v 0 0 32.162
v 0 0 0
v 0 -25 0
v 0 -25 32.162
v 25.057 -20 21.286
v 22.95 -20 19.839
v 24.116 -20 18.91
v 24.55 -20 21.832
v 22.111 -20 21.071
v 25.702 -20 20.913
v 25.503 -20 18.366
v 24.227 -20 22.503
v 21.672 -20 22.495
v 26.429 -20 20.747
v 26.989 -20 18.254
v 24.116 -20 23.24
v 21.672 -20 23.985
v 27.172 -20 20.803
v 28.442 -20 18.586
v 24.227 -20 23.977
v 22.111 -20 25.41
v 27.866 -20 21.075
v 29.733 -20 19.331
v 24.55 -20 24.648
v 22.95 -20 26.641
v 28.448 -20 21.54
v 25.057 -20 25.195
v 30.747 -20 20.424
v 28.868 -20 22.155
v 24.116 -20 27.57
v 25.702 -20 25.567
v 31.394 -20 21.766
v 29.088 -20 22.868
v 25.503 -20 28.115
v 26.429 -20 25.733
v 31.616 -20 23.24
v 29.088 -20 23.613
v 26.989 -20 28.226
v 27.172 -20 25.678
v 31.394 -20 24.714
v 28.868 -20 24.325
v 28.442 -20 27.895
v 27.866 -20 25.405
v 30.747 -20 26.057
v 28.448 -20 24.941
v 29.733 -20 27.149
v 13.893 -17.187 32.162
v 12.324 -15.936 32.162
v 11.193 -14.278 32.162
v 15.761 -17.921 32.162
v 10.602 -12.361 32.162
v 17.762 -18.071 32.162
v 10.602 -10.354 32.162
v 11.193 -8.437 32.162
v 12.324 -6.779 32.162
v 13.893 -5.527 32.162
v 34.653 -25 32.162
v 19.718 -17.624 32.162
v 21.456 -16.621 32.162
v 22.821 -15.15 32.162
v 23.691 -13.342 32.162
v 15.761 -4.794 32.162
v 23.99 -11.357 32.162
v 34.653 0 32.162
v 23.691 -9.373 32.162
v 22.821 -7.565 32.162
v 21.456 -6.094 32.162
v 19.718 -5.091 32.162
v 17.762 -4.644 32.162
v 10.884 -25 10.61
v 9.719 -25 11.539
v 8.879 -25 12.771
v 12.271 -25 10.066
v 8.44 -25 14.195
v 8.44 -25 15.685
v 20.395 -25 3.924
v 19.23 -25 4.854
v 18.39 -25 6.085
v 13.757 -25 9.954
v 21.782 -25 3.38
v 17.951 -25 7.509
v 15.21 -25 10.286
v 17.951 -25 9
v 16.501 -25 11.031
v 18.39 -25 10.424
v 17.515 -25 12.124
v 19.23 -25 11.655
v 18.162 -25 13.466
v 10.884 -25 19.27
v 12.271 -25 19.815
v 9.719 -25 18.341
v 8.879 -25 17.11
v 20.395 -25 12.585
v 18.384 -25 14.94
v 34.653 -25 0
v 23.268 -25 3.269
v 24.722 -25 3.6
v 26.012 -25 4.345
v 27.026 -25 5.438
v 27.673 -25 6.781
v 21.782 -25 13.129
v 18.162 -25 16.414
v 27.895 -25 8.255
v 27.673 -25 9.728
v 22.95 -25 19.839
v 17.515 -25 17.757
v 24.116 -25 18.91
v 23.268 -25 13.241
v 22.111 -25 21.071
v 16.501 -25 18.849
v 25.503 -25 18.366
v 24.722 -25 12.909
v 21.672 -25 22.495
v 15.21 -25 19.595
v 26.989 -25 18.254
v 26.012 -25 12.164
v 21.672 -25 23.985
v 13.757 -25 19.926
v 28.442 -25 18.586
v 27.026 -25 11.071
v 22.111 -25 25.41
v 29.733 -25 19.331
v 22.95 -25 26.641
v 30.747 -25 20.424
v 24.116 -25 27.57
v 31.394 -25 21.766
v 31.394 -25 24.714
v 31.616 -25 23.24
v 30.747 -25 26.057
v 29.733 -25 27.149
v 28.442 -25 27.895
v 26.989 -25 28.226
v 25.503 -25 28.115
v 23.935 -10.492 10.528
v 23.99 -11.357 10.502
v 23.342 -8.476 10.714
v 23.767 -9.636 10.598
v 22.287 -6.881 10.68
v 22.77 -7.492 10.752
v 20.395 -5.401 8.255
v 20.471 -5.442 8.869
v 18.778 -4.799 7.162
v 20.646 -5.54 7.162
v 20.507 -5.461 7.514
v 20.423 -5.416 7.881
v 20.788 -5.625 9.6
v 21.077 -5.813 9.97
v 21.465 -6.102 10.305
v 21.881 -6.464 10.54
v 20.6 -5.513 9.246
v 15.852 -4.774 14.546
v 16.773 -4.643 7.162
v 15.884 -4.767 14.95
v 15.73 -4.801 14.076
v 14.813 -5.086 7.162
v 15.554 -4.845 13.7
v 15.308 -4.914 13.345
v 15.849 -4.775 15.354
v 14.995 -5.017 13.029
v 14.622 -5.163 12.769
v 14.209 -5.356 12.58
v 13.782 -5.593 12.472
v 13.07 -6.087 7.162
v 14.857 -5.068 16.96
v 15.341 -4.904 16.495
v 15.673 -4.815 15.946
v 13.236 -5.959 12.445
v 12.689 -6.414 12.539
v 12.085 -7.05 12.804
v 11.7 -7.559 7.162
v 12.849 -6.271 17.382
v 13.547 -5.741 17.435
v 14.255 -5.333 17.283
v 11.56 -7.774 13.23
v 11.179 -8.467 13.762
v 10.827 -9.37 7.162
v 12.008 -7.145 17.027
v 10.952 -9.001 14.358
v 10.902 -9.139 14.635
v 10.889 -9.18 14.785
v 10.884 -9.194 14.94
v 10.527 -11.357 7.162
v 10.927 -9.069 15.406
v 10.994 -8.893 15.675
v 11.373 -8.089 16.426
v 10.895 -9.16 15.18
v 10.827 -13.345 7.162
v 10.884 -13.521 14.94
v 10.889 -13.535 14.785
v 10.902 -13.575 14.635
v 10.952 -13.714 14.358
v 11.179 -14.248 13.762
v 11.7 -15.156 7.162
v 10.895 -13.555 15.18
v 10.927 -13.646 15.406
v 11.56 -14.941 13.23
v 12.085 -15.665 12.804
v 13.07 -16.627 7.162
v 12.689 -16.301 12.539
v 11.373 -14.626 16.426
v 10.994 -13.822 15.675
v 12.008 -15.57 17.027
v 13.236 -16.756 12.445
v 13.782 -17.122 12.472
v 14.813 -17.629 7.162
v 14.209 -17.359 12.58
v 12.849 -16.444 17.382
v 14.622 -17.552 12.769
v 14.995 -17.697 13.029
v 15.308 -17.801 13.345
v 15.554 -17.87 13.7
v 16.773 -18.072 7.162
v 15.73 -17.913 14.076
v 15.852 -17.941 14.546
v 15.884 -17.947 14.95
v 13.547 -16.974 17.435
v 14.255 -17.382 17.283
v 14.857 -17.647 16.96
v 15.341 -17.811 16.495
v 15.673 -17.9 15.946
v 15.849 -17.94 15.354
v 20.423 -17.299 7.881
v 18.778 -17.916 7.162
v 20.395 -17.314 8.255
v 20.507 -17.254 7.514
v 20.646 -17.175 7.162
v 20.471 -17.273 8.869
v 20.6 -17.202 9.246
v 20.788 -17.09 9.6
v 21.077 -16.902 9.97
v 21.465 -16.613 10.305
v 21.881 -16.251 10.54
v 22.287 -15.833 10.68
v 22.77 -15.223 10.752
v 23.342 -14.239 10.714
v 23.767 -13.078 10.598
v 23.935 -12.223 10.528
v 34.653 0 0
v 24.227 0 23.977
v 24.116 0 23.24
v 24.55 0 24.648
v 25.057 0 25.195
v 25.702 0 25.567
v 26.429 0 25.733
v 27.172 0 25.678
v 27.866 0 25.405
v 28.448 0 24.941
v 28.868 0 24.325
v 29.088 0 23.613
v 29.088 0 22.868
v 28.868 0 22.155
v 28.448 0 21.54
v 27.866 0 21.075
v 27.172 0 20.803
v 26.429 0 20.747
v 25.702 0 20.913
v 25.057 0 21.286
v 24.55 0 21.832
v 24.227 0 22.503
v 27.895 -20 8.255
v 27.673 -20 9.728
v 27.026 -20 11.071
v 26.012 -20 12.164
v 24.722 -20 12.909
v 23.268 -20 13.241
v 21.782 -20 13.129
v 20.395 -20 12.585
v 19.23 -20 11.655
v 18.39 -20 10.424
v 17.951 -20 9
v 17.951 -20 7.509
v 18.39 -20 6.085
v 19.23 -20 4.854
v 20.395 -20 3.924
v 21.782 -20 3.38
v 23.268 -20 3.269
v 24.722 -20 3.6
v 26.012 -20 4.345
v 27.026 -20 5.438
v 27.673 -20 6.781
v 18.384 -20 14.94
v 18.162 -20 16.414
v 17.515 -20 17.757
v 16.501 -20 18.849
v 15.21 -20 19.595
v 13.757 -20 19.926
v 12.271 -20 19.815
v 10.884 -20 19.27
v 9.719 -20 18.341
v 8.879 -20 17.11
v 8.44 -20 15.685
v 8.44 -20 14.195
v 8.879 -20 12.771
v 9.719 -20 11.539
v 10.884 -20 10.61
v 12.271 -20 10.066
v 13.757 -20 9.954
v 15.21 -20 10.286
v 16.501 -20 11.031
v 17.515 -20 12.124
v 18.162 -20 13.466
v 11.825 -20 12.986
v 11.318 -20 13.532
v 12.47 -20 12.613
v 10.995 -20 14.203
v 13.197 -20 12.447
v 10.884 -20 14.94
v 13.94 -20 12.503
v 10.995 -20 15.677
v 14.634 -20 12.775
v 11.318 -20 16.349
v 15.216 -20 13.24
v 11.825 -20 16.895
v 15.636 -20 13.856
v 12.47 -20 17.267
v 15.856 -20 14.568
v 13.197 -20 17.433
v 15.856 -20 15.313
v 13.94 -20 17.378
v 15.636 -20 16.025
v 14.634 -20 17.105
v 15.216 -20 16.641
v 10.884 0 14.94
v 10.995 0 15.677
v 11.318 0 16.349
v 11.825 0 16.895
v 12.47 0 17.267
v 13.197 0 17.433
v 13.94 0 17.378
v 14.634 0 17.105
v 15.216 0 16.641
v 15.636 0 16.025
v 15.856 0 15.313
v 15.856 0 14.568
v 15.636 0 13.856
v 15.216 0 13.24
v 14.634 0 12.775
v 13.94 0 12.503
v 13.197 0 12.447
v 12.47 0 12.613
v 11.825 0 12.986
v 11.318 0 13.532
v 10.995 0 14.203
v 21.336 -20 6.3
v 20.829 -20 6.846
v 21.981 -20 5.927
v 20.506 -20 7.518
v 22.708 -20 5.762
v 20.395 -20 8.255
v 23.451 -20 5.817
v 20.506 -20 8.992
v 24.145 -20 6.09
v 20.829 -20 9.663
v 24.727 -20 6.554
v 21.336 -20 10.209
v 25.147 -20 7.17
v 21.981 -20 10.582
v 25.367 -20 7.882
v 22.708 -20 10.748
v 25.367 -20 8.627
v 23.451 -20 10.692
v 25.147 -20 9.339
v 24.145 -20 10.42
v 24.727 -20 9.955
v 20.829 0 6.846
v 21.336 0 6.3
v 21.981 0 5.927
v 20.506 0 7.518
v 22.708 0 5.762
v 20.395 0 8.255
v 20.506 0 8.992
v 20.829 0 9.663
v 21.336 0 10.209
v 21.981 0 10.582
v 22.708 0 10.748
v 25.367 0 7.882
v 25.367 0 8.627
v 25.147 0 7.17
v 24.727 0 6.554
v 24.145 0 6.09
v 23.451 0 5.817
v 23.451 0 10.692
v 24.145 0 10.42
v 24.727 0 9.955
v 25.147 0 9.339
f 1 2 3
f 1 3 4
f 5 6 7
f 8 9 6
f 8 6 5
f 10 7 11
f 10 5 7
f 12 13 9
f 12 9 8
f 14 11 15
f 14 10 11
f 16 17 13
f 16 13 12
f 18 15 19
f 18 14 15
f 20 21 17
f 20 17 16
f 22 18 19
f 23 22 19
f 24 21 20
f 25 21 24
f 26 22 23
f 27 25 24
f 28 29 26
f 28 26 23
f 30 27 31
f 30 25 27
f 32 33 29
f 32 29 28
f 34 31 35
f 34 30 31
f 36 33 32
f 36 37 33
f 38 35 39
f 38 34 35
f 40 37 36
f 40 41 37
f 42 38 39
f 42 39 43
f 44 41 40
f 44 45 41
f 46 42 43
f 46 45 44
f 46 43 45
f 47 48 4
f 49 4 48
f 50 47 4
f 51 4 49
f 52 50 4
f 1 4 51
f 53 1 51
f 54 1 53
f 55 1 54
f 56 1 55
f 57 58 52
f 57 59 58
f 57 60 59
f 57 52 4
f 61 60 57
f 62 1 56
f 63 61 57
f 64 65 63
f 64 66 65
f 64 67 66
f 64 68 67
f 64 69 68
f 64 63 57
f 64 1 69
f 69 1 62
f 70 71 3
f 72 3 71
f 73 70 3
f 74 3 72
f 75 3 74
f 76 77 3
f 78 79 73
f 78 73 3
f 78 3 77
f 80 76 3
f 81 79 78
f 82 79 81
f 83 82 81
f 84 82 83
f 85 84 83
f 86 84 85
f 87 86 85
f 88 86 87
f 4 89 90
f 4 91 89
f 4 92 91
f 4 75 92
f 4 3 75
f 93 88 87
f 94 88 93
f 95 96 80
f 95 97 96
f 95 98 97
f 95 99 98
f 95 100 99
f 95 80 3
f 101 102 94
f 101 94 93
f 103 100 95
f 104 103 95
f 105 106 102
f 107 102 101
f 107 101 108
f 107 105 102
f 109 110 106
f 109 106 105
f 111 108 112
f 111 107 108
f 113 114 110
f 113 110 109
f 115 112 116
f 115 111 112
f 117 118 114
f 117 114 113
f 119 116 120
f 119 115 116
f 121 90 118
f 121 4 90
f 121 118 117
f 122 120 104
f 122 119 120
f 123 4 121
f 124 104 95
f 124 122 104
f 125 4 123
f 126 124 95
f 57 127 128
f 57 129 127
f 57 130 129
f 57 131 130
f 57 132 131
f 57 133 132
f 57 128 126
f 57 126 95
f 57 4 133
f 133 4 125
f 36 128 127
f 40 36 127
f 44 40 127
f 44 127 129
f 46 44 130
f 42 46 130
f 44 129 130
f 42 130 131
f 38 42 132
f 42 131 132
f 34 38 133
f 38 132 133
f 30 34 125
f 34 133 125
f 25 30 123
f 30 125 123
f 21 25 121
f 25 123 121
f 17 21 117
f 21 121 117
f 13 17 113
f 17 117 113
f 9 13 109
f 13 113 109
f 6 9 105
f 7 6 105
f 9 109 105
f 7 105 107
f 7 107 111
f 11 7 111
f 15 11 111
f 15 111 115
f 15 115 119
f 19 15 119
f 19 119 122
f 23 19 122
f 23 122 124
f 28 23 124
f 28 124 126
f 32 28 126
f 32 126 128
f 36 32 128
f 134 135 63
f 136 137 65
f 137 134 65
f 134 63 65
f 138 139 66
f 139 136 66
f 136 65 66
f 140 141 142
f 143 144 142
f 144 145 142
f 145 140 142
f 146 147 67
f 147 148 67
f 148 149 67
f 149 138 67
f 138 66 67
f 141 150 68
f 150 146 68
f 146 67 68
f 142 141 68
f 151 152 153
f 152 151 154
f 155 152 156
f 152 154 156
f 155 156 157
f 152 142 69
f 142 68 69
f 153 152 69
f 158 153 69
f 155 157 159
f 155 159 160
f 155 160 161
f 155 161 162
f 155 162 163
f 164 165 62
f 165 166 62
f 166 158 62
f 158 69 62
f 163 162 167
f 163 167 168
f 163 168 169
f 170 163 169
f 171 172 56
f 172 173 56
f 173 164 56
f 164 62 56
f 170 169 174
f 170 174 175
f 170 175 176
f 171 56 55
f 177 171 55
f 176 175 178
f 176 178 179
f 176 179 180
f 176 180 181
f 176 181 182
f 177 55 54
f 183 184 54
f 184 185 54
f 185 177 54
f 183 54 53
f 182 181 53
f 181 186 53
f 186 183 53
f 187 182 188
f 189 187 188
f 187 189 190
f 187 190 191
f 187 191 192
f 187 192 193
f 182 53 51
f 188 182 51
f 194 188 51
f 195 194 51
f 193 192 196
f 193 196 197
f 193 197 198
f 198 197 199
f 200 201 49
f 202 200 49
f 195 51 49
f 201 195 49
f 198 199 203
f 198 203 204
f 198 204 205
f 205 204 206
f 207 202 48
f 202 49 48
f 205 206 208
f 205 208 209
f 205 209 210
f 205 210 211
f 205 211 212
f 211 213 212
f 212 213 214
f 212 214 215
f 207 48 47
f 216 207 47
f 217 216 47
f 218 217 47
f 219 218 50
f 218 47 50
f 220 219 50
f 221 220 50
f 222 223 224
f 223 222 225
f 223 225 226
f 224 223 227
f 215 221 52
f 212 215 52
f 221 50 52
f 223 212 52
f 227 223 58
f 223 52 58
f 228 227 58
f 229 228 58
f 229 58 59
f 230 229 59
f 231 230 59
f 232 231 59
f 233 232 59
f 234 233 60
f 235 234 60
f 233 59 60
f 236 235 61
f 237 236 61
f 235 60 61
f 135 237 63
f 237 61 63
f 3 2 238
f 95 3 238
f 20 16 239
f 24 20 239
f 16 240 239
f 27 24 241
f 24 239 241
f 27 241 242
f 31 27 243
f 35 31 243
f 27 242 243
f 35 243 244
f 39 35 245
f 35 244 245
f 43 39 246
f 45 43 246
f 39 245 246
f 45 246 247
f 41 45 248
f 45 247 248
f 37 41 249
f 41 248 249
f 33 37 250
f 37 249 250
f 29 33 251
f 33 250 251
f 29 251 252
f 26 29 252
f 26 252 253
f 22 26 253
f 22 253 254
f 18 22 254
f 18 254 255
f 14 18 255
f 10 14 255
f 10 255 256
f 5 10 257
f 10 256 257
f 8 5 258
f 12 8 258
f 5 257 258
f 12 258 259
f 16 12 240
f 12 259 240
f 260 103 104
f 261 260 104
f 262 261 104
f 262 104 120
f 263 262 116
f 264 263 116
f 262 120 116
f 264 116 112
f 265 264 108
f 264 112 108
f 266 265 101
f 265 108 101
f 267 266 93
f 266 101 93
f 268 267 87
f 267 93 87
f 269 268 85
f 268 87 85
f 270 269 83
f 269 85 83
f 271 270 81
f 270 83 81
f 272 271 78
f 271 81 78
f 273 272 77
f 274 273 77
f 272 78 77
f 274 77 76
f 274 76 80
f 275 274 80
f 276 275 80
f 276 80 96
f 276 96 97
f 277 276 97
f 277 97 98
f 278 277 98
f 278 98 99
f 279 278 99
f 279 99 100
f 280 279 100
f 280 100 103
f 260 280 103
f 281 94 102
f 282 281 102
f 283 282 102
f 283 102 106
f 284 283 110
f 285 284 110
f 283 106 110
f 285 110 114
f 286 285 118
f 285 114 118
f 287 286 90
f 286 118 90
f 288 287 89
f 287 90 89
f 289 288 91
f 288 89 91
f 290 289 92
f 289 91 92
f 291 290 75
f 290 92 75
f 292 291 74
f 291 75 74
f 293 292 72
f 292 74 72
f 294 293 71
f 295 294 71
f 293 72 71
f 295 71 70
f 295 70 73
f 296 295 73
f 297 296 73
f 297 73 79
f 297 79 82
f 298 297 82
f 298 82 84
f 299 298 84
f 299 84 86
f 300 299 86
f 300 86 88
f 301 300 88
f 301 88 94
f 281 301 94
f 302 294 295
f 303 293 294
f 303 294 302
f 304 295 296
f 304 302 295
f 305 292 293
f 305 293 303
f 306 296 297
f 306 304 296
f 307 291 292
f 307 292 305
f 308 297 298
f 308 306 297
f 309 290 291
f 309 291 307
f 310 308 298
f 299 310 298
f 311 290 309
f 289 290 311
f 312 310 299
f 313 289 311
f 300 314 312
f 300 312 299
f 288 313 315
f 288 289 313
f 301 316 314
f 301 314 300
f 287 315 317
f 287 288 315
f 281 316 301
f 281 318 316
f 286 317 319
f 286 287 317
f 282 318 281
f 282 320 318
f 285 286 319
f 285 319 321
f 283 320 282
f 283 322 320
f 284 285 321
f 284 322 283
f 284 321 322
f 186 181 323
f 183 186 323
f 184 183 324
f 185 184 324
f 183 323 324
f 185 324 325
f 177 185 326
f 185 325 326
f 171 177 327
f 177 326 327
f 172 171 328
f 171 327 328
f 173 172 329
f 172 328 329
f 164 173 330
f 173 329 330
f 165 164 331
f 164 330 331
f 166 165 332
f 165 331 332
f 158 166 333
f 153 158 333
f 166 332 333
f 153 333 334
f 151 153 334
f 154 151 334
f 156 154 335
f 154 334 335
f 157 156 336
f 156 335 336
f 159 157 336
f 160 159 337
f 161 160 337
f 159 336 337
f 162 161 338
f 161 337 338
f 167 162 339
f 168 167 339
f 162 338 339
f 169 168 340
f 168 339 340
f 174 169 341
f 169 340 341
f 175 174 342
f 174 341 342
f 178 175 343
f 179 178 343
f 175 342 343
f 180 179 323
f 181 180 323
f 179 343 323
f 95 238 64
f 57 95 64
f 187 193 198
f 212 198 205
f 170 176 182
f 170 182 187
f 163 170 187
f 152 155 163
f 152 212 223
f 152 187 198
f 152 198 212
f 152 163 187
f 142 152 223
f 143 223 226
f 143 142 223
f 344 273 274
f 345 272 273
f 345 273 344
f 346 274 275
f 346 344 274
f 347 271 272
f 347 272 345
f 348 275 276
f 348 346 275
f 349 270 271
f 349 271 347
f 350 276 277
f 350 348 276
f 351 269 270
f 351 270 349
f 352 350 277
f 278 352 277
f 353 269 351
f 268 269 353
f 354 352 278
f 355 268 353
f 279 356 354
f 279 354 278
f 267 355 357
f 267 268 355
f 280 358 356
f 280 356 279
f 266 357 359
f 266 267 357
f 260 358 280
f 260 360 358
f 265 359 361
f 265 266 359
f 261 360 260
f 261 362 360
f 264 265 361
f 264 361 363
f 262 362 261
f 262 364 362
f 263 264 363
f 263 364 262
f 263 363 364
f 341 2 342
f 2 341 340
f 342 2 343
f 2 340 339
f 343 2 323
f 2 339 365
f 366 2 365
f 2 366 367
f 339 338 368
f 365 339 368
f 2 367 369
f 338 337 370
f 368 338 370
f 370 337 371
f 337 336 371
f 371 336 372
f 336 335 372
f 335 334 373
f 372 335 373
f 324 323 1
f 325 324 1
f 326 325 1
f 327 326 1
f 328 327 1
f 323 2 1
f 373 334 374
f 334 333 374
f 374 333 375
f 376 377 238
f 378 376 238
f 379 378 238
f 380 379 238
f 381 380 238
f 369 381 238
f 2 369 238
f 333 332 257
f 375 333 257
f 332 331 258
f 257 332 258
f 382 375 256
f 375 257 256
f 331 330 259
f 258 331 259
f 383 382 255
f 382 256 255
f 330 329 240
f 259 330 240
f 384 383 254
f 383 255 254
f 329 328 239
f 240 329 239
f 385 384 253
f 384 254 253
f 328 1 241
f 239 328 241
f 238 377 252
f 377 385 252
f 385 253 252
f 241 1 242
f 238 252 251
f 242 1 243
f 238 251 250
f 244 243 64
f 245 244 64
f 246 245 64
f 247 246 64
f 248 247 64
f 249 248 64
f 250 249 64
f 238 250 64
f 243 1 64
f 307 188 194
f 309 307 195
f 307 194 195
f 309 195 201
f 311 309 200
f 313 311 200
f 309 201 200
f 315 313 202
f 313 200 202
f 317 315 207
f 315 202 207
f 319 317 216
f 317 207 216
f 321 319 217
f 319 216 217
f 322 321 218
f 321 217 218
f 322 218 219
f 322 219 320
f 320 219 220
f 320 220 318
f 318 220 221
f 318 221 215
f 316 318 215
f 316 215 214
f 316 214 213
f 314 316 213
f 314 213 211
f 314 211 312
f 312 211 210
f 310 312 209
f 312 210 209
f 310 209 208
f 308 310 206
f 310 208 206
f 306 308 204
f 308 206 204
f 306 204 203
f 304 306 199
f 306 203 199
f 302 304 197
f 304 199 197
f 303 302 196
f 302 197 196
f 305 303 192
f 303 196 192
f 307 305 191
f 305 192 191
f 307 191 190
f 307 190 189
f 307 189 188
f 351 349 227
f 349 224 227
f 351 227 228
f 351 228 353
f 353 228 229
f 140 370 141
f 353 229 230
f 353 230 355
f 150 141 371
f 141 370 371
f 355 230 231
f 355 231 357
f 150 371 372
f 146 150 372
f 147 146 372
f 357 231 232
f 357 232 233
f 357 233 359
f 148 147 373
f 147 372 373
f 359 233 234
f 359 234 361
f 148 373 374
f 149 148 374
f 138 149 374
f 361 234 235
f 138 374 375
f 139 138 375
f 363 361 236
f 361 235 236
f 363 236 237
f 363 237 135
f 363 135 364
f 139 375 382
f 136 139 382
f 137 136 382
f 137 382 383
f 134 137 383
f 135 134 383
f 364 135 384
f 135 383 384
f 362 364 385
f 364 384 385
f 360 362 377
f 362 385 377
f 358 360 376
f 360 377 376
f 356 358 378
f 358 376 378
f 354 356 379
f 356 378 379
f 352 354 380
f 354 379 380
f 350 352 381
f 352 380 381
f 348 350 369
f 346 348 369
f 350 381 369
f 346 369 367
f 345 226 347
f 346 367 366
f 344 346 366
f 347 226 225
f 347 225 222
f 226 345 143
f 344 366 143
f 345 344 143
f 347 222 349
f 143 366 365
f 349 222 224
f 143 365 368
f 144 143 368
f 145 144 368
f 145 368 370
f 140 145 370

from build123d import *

# Parameters (mm, degrees)
F0_W           = 34.65341
F0_H           = 32.161761
F1_DEPTH       = 25
F2_R           = 6.731934
F3_DEPTH       = 25
F5_D           = 5
F5_CBORE_D     = 10
F5_CBORE_DEPTH = 5


with BuildPart() as f1:
    # F0 (on Front) → F1 (new body)
    with BuildSketch(Plane.XZ):
        with Locations((17.326705, 16.08088)):
            Rectangle(F0_W, F0_H)
    extrude(amount=F1_DEPTH)

    # F2 (on face) → F3 (cut)
    with BuildSketch(Plane.XY.offset(32.161761)):
        with Locations((17.258551, -11.357421)):
            Circle(F2_R)
    extrude(amount=-F3_DEPTH, mode=Mode.SUBTRACT)

    # F5 (through all)
    with Locations(Plane.XZ.offset(25)):
        with Locations((13.383781, 14.940267), (26.61572, 23.240186), (22.894813, 8.254618)):
            CounterBoreHole(F5_D / 2, F5_CBORE_D / 2, F5_CBORE_DEPTH)


solid = f1.part
